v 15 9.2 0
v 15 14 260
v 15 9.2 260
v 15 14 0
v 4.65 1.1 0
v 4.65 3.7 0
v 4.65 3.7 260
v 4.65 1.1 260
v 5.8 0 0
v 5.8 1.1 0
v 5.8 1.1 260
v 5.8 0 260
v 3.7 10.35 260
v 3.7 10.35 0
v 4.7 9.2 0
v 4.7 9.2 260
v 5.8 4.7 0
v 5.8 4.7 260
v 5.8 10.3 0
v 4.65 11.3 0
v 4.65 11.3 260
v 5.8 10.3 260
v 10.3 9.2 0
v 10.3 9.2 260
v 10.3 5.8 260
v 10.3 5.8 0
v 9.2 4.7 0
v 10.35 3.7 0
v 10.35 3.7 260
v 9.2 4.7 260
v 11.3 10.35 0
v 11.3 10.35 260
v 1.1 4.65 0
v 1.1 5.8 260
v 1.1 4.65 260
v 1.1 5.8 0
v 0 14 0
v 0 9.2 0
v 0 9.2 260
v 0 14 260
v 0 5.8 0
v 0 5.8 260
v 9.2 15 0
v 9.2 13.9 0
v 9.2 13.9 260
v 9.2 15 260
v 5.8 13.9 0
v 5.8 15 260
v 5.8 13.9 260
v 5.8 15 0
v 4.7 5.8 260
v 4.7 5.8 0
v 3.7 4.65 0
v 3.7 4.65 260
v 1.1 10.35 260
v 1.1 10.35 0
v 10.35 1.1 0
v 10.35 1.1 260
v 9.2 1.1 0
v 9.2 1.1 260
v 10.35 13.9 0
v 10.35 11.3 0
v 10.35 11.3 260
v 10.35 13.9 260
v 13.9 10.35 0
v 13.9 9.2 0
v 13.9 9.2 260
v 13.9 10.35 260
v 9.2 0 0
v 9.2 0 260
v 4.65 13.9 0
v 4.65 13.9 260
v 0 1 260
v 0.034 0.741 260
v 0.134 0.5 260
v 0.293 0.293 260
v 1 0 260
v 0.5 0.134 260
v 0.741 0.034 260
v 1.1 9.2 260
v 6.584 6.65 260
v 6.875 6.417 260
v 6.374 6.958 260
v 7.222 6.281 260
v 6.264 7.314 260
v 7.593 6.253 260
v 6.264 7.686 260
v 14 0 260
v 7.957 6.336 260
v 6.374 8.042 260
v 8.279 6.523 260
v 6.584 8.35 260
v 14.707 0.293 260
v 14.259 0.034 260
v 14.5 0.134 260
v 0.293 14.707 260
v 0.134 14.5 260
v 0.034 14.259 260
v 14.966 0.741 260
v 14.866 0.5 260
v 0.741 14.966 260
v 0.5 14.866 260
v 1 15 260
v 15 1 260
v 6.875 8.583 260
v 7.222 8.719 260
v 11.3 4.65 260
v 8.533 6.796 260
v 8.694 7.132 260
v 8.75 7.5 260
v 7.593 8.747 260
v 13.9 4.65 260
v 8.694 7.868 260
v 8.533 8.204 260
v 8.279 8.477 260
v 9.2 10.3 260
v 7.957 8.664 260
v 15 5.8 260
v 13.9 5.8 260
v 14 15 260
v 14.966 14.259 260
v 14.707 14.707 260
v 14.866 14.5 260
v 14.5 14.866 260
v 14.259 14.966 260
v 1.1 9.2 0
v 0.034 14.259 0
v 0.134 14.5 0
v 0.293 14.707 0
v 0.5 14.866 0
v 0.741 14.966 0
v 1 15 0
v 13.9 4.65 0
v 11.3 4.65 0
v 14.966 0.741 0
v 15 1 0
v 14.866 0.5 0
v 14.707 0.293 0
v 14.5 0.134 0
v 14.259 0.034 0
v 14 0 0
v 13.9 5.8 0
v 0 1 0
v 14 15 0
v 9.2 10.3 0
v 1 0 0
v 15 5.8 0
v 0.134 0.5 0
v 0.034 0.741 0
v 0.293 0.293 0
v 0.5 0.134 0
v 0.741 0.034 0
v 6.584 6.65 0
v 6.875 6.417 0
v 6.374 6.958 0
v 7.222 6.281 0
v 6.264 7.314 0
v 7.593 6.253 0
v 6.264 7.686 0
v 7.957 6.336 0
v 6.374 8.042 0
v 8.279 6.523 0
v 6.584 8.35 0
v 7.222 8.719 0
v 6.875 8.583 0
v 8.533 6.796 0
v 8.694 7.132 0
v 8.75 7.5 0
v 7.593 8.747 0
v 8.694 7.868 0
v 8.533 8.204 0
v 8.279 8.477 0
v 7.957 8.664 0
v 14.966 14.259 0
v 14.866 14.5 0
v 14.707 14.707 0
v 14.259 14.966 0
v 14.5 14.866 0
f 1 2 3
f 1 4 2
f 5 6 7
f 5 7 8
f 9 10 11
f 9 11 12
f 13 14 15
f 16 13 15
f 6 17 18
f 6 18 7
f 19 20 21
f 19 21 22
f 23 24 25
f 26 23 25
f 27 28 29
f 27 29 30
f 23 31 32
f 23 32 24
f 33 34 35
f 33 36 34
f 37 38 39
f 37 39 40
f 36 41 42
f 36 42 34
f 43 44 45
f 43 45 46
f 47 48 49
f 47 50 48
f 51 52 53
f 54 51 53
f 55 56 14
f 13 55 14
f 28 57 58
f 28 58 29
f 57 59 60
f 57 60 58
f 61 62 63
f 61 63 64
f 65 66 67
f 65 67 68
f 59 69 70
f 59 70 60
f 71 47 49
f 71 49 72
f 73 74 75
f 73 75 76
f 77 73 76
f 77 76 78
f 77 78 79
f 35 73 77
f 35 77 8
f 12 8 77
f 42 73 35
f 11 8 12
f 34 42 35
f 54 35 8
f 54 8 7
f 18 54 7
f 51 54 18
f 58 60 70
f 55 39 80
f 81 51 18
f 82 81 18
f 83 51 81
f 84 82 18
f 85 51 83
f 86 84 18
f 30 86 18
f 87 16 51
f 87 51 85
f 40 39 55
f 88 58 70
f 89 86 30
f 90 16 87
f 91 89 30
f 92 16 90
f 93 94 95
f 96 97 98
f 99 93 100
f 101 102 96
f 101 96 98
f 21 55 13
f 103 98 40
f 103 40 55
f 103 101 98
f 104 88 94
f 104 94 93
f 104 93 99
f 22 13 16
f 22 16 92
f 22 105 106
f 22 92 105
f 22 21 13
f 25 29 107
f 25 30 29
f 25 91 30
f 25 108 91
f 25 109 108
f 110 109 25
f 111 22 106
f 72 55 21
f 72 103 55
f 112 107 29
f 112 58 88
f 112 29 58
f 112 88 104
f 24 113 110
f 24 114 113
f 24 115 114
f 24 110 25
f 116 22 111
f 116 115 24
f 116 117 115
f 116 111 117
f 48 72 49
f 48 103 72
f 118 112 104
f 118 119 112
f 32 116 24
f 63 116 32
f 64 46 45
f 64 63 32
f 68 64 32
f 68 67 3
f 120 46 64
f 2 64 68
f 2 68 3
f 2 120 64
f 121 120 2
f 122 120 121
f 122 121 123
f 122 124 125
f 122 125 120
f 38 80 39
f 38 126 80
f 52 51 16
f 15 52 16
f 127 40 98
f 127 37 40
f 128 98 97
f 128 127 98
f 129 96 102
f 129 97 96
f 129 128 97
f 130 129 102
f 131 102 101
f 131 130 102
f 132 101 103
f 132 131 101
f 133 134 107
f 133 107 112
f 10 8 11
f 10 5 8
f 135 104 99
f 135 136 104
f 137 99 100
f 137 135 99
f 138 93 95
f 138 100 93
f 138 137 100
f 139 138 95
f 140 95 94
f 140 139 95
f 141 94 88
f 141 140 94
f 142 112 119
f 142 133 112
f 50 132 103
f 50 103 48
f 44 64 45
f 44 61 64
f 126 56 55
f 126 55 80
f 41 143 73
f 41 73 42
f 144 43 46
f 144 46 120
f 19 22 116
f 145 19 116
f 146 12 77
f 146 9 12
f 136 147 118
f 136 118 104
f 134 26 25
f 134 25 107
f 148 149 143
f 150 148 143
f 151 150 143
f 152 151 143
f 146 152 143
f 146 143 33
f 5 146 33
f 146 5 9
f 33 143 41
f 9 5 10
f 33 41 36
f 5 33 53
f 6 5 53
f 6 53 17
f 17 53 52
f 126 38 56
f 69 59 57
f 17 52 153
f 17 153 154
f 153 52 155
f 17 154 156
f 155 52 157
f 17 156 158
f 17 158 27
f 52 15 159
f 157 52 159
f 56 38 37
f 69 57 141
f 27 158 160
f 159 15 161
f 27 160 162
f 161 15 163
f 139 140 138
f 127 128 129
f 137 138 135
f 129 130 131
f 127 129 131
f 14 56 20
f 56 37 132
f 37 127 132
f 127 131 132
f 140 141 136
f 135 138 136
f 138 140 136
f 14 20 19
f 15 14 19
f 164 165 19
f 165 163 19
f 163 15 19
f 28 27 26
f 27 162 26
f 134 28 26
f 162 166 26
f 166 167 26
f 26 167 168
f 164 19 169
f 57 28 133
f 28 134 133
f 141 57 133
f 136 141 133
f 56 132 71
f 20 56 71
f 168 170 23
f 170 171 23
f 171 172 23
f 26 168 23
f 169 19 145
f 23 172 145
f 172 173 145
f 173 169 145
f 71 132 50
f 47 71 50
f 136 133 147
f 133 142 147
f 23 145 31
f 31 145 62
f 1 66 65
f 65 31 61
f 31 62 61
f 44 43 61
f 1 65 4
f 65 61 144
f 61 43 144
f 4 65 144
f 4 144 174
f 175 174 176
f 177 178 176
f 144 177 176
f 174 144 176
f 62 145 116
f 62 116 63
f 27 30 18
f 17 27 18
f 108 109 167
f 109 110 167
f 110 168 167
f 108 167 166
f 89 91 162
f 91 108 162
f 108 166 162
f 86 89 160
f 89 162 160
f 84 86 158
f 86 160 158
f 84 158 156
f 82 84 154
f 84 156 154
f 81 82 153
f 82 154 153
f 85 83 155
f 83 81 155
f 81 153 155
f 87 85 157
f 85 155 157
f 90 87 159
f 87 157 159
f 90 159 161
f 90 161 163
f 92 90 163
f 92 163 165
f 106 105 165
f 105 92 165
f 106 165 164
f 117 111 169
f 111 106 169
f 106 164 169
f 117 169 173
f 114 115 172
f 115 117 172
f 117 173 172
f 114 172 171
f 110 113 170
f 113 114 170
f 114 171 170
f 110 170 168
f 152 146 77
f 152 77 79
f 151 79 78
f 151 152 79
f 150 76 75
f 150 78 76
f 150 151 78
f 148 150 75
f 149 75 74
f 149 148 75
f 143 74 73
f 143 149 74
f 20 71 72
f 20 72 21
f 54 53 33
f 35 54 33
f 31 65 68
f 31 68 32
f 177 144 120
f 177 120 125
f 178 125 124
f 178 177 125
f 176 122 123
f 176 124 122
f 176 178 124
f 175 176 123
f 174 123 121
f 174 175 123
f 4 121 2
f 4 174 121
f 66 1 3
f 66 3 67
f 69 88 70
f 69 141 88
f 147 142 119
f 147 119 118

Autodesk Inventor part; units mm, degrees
ref_plane "YZ Plane" through (0, 0, 0) normal (1, 0, 0) x (0, 1, 0)
ref_plane "XZ Plane" through (0, 0, 0) normal (0, 1, 0) x (-1, 0, 0)
ref_plane "XY Plane" through (0, 0, 0) normal (0, 0, 1) x (1, 0, 0)
sketch "Sketch1" plane through (0, 0, 0) normal (0, 0, 1) x (1, 0, 0)
  line L0 (0, 0) -> (0, 5.8)
  line L1 (0, 5.8) -> (1.1, 5.8)
  line L2 (1.1, 5.8) -> (1.1, 4.65)
  line L3 (4.7, 5.8) -> (4.7, 9.2)
  line L4 (1.1, 10.35) -> (1.1, 9.2)
  line L5 (1.1, 9.2) -> (0, 9.2)
  line L6 (0, 9.2) -> (0, 15)
  line L7 (0, 15) -> (5.8, 15)
  line L8 (5.8, 15) -> (5.8, 13.9)
  line L9 (5.8, 13.9) -> (4.65, 13.9)
  line L10 (5.8, 10.3) -> (9.2, 10.3)
  line L11 (10.35, 13.9) -> (9.2, 13.9)
  line L12 (9.2, 13.9) -> (9.2, 15)
  line L13 (9.2, 15) -> (15, 15)
  line L14 (15, 15) -> (15, 9.2)
  line L15 (15, 9.2) -> (13.9, 9.2)
  line L16 (13.9, 9.2) -> (13.9, 10.35)
  line L17 (10.3, 9.2) -> (10.3, 5.8)
  line L18 (13.9, 4.65) -> (13.9, 5.8)
  line L19 (13.9, 5.8) -> (15, 5.8)
  line L20 (15, 5.8) -> (15, 0)
  line L21 (15, 0) -> (9.2, 0)
  line L22 (9.2, 0) -> (9.2, 1.1)
  line L23 (9.2, 1.1) -> (10.35, 1.1)
  line L24 (9.2, 4.7) -> (5.8, 4.7)
  line L25 (4.65, 1.1) -> (5.8, 1.1)
  line L26 (5.8, 1.1) -> (5.8, 0)
  line L27 (5.8, 0) -> (0, 0)
  circle A0 centre (7.5, 7.5) radius 1.25
  line L28 (1.1, 10.35) -> (3.7, 10.35)
  line L29 (3.7, 10.35) -> (4.7, 9.2)
  line L30 (4.7, 5.8) -> (3.7, 4.65)
  line L31 (3.7, 4.65) -> (1.1, 4.65)
  line L32 (4.65, 13.9) -> (4.65, 11.3)
  line L33 (4.65, 11.3) -> (5.8, 10.3)
  line L34 (9.2, 10.3) -> (10.35, 11.3)
  line L35 (10.35, 11.3) -> (10.35, 13.9)
  line L36 (13.9, 10.35) -> (11.3, 10.35)
  line L37 (11.3, 10.35) -> (10.3, 9.2)
  line L38 (10.3, 5.8) -> (11.3, 4.65)
  line L39 (11.3, 4.65) -> (13.9, 4.65)
  line L40 (10.35, 1.1) -> (10.35, 3.7)
  line L41 (10.35, 3.7) -> (9.2, 4.7)
  line L42 (5.8, 4.7) -> (4.65, 3.7)
  line L43 (4.65, 3.7) -> (4.65, 1.1)
  arc A1 (1, 15) -> (0, 14) centre (1, 14) ccw
  arc A2 (15, 14) -> (14, 15) centre (14, 14) ccw
  arc A3 (14, 0) -> (15, 1) centre (14, 1) ccw
  arc A4 (0, 1) -> (1, 0) centre (1, 1) ccw
  dimension "d6" = 15
  dimension "d7" = 1.1
  dimension "d8" = 5.7
  dimension "d9" = 3.4
  dimension "d10" = 2.5
  dimension "d13" = 7.5
  dimension "d14" = 7.5
  dimension "d18" = 15
  dimension "d19" = 3.6
  dimension "d20" = 1
  dimension "d21" = 3.4
  dimension "d22" = 1
extrude "Extrusion1" add sketch "Sketch1" along normal blind 260 contours L0 L1 L2 L31 L30 L3 L29 L28 L4 L5 L6 A1 L7 L8 L9 L32 L33 L10 L34 L35 L11 L12 L13 A2 L14 L15 L16 L36 L37 L17 L38 L39 L18 L19 L20 A3 L21 L22 L23 L40 L41 L24 L42 L43 L25 L26 L27 A4
equation "\"d13\" = 0.5 * d6"
equation "\"d14\" = 0.5 * d6"
equation "\"d18\" = d6"
equation "\"d21\" = d9"
properties part number "Rail_Misumi_HFS3-1515-260" material "Aluminum 6061"
